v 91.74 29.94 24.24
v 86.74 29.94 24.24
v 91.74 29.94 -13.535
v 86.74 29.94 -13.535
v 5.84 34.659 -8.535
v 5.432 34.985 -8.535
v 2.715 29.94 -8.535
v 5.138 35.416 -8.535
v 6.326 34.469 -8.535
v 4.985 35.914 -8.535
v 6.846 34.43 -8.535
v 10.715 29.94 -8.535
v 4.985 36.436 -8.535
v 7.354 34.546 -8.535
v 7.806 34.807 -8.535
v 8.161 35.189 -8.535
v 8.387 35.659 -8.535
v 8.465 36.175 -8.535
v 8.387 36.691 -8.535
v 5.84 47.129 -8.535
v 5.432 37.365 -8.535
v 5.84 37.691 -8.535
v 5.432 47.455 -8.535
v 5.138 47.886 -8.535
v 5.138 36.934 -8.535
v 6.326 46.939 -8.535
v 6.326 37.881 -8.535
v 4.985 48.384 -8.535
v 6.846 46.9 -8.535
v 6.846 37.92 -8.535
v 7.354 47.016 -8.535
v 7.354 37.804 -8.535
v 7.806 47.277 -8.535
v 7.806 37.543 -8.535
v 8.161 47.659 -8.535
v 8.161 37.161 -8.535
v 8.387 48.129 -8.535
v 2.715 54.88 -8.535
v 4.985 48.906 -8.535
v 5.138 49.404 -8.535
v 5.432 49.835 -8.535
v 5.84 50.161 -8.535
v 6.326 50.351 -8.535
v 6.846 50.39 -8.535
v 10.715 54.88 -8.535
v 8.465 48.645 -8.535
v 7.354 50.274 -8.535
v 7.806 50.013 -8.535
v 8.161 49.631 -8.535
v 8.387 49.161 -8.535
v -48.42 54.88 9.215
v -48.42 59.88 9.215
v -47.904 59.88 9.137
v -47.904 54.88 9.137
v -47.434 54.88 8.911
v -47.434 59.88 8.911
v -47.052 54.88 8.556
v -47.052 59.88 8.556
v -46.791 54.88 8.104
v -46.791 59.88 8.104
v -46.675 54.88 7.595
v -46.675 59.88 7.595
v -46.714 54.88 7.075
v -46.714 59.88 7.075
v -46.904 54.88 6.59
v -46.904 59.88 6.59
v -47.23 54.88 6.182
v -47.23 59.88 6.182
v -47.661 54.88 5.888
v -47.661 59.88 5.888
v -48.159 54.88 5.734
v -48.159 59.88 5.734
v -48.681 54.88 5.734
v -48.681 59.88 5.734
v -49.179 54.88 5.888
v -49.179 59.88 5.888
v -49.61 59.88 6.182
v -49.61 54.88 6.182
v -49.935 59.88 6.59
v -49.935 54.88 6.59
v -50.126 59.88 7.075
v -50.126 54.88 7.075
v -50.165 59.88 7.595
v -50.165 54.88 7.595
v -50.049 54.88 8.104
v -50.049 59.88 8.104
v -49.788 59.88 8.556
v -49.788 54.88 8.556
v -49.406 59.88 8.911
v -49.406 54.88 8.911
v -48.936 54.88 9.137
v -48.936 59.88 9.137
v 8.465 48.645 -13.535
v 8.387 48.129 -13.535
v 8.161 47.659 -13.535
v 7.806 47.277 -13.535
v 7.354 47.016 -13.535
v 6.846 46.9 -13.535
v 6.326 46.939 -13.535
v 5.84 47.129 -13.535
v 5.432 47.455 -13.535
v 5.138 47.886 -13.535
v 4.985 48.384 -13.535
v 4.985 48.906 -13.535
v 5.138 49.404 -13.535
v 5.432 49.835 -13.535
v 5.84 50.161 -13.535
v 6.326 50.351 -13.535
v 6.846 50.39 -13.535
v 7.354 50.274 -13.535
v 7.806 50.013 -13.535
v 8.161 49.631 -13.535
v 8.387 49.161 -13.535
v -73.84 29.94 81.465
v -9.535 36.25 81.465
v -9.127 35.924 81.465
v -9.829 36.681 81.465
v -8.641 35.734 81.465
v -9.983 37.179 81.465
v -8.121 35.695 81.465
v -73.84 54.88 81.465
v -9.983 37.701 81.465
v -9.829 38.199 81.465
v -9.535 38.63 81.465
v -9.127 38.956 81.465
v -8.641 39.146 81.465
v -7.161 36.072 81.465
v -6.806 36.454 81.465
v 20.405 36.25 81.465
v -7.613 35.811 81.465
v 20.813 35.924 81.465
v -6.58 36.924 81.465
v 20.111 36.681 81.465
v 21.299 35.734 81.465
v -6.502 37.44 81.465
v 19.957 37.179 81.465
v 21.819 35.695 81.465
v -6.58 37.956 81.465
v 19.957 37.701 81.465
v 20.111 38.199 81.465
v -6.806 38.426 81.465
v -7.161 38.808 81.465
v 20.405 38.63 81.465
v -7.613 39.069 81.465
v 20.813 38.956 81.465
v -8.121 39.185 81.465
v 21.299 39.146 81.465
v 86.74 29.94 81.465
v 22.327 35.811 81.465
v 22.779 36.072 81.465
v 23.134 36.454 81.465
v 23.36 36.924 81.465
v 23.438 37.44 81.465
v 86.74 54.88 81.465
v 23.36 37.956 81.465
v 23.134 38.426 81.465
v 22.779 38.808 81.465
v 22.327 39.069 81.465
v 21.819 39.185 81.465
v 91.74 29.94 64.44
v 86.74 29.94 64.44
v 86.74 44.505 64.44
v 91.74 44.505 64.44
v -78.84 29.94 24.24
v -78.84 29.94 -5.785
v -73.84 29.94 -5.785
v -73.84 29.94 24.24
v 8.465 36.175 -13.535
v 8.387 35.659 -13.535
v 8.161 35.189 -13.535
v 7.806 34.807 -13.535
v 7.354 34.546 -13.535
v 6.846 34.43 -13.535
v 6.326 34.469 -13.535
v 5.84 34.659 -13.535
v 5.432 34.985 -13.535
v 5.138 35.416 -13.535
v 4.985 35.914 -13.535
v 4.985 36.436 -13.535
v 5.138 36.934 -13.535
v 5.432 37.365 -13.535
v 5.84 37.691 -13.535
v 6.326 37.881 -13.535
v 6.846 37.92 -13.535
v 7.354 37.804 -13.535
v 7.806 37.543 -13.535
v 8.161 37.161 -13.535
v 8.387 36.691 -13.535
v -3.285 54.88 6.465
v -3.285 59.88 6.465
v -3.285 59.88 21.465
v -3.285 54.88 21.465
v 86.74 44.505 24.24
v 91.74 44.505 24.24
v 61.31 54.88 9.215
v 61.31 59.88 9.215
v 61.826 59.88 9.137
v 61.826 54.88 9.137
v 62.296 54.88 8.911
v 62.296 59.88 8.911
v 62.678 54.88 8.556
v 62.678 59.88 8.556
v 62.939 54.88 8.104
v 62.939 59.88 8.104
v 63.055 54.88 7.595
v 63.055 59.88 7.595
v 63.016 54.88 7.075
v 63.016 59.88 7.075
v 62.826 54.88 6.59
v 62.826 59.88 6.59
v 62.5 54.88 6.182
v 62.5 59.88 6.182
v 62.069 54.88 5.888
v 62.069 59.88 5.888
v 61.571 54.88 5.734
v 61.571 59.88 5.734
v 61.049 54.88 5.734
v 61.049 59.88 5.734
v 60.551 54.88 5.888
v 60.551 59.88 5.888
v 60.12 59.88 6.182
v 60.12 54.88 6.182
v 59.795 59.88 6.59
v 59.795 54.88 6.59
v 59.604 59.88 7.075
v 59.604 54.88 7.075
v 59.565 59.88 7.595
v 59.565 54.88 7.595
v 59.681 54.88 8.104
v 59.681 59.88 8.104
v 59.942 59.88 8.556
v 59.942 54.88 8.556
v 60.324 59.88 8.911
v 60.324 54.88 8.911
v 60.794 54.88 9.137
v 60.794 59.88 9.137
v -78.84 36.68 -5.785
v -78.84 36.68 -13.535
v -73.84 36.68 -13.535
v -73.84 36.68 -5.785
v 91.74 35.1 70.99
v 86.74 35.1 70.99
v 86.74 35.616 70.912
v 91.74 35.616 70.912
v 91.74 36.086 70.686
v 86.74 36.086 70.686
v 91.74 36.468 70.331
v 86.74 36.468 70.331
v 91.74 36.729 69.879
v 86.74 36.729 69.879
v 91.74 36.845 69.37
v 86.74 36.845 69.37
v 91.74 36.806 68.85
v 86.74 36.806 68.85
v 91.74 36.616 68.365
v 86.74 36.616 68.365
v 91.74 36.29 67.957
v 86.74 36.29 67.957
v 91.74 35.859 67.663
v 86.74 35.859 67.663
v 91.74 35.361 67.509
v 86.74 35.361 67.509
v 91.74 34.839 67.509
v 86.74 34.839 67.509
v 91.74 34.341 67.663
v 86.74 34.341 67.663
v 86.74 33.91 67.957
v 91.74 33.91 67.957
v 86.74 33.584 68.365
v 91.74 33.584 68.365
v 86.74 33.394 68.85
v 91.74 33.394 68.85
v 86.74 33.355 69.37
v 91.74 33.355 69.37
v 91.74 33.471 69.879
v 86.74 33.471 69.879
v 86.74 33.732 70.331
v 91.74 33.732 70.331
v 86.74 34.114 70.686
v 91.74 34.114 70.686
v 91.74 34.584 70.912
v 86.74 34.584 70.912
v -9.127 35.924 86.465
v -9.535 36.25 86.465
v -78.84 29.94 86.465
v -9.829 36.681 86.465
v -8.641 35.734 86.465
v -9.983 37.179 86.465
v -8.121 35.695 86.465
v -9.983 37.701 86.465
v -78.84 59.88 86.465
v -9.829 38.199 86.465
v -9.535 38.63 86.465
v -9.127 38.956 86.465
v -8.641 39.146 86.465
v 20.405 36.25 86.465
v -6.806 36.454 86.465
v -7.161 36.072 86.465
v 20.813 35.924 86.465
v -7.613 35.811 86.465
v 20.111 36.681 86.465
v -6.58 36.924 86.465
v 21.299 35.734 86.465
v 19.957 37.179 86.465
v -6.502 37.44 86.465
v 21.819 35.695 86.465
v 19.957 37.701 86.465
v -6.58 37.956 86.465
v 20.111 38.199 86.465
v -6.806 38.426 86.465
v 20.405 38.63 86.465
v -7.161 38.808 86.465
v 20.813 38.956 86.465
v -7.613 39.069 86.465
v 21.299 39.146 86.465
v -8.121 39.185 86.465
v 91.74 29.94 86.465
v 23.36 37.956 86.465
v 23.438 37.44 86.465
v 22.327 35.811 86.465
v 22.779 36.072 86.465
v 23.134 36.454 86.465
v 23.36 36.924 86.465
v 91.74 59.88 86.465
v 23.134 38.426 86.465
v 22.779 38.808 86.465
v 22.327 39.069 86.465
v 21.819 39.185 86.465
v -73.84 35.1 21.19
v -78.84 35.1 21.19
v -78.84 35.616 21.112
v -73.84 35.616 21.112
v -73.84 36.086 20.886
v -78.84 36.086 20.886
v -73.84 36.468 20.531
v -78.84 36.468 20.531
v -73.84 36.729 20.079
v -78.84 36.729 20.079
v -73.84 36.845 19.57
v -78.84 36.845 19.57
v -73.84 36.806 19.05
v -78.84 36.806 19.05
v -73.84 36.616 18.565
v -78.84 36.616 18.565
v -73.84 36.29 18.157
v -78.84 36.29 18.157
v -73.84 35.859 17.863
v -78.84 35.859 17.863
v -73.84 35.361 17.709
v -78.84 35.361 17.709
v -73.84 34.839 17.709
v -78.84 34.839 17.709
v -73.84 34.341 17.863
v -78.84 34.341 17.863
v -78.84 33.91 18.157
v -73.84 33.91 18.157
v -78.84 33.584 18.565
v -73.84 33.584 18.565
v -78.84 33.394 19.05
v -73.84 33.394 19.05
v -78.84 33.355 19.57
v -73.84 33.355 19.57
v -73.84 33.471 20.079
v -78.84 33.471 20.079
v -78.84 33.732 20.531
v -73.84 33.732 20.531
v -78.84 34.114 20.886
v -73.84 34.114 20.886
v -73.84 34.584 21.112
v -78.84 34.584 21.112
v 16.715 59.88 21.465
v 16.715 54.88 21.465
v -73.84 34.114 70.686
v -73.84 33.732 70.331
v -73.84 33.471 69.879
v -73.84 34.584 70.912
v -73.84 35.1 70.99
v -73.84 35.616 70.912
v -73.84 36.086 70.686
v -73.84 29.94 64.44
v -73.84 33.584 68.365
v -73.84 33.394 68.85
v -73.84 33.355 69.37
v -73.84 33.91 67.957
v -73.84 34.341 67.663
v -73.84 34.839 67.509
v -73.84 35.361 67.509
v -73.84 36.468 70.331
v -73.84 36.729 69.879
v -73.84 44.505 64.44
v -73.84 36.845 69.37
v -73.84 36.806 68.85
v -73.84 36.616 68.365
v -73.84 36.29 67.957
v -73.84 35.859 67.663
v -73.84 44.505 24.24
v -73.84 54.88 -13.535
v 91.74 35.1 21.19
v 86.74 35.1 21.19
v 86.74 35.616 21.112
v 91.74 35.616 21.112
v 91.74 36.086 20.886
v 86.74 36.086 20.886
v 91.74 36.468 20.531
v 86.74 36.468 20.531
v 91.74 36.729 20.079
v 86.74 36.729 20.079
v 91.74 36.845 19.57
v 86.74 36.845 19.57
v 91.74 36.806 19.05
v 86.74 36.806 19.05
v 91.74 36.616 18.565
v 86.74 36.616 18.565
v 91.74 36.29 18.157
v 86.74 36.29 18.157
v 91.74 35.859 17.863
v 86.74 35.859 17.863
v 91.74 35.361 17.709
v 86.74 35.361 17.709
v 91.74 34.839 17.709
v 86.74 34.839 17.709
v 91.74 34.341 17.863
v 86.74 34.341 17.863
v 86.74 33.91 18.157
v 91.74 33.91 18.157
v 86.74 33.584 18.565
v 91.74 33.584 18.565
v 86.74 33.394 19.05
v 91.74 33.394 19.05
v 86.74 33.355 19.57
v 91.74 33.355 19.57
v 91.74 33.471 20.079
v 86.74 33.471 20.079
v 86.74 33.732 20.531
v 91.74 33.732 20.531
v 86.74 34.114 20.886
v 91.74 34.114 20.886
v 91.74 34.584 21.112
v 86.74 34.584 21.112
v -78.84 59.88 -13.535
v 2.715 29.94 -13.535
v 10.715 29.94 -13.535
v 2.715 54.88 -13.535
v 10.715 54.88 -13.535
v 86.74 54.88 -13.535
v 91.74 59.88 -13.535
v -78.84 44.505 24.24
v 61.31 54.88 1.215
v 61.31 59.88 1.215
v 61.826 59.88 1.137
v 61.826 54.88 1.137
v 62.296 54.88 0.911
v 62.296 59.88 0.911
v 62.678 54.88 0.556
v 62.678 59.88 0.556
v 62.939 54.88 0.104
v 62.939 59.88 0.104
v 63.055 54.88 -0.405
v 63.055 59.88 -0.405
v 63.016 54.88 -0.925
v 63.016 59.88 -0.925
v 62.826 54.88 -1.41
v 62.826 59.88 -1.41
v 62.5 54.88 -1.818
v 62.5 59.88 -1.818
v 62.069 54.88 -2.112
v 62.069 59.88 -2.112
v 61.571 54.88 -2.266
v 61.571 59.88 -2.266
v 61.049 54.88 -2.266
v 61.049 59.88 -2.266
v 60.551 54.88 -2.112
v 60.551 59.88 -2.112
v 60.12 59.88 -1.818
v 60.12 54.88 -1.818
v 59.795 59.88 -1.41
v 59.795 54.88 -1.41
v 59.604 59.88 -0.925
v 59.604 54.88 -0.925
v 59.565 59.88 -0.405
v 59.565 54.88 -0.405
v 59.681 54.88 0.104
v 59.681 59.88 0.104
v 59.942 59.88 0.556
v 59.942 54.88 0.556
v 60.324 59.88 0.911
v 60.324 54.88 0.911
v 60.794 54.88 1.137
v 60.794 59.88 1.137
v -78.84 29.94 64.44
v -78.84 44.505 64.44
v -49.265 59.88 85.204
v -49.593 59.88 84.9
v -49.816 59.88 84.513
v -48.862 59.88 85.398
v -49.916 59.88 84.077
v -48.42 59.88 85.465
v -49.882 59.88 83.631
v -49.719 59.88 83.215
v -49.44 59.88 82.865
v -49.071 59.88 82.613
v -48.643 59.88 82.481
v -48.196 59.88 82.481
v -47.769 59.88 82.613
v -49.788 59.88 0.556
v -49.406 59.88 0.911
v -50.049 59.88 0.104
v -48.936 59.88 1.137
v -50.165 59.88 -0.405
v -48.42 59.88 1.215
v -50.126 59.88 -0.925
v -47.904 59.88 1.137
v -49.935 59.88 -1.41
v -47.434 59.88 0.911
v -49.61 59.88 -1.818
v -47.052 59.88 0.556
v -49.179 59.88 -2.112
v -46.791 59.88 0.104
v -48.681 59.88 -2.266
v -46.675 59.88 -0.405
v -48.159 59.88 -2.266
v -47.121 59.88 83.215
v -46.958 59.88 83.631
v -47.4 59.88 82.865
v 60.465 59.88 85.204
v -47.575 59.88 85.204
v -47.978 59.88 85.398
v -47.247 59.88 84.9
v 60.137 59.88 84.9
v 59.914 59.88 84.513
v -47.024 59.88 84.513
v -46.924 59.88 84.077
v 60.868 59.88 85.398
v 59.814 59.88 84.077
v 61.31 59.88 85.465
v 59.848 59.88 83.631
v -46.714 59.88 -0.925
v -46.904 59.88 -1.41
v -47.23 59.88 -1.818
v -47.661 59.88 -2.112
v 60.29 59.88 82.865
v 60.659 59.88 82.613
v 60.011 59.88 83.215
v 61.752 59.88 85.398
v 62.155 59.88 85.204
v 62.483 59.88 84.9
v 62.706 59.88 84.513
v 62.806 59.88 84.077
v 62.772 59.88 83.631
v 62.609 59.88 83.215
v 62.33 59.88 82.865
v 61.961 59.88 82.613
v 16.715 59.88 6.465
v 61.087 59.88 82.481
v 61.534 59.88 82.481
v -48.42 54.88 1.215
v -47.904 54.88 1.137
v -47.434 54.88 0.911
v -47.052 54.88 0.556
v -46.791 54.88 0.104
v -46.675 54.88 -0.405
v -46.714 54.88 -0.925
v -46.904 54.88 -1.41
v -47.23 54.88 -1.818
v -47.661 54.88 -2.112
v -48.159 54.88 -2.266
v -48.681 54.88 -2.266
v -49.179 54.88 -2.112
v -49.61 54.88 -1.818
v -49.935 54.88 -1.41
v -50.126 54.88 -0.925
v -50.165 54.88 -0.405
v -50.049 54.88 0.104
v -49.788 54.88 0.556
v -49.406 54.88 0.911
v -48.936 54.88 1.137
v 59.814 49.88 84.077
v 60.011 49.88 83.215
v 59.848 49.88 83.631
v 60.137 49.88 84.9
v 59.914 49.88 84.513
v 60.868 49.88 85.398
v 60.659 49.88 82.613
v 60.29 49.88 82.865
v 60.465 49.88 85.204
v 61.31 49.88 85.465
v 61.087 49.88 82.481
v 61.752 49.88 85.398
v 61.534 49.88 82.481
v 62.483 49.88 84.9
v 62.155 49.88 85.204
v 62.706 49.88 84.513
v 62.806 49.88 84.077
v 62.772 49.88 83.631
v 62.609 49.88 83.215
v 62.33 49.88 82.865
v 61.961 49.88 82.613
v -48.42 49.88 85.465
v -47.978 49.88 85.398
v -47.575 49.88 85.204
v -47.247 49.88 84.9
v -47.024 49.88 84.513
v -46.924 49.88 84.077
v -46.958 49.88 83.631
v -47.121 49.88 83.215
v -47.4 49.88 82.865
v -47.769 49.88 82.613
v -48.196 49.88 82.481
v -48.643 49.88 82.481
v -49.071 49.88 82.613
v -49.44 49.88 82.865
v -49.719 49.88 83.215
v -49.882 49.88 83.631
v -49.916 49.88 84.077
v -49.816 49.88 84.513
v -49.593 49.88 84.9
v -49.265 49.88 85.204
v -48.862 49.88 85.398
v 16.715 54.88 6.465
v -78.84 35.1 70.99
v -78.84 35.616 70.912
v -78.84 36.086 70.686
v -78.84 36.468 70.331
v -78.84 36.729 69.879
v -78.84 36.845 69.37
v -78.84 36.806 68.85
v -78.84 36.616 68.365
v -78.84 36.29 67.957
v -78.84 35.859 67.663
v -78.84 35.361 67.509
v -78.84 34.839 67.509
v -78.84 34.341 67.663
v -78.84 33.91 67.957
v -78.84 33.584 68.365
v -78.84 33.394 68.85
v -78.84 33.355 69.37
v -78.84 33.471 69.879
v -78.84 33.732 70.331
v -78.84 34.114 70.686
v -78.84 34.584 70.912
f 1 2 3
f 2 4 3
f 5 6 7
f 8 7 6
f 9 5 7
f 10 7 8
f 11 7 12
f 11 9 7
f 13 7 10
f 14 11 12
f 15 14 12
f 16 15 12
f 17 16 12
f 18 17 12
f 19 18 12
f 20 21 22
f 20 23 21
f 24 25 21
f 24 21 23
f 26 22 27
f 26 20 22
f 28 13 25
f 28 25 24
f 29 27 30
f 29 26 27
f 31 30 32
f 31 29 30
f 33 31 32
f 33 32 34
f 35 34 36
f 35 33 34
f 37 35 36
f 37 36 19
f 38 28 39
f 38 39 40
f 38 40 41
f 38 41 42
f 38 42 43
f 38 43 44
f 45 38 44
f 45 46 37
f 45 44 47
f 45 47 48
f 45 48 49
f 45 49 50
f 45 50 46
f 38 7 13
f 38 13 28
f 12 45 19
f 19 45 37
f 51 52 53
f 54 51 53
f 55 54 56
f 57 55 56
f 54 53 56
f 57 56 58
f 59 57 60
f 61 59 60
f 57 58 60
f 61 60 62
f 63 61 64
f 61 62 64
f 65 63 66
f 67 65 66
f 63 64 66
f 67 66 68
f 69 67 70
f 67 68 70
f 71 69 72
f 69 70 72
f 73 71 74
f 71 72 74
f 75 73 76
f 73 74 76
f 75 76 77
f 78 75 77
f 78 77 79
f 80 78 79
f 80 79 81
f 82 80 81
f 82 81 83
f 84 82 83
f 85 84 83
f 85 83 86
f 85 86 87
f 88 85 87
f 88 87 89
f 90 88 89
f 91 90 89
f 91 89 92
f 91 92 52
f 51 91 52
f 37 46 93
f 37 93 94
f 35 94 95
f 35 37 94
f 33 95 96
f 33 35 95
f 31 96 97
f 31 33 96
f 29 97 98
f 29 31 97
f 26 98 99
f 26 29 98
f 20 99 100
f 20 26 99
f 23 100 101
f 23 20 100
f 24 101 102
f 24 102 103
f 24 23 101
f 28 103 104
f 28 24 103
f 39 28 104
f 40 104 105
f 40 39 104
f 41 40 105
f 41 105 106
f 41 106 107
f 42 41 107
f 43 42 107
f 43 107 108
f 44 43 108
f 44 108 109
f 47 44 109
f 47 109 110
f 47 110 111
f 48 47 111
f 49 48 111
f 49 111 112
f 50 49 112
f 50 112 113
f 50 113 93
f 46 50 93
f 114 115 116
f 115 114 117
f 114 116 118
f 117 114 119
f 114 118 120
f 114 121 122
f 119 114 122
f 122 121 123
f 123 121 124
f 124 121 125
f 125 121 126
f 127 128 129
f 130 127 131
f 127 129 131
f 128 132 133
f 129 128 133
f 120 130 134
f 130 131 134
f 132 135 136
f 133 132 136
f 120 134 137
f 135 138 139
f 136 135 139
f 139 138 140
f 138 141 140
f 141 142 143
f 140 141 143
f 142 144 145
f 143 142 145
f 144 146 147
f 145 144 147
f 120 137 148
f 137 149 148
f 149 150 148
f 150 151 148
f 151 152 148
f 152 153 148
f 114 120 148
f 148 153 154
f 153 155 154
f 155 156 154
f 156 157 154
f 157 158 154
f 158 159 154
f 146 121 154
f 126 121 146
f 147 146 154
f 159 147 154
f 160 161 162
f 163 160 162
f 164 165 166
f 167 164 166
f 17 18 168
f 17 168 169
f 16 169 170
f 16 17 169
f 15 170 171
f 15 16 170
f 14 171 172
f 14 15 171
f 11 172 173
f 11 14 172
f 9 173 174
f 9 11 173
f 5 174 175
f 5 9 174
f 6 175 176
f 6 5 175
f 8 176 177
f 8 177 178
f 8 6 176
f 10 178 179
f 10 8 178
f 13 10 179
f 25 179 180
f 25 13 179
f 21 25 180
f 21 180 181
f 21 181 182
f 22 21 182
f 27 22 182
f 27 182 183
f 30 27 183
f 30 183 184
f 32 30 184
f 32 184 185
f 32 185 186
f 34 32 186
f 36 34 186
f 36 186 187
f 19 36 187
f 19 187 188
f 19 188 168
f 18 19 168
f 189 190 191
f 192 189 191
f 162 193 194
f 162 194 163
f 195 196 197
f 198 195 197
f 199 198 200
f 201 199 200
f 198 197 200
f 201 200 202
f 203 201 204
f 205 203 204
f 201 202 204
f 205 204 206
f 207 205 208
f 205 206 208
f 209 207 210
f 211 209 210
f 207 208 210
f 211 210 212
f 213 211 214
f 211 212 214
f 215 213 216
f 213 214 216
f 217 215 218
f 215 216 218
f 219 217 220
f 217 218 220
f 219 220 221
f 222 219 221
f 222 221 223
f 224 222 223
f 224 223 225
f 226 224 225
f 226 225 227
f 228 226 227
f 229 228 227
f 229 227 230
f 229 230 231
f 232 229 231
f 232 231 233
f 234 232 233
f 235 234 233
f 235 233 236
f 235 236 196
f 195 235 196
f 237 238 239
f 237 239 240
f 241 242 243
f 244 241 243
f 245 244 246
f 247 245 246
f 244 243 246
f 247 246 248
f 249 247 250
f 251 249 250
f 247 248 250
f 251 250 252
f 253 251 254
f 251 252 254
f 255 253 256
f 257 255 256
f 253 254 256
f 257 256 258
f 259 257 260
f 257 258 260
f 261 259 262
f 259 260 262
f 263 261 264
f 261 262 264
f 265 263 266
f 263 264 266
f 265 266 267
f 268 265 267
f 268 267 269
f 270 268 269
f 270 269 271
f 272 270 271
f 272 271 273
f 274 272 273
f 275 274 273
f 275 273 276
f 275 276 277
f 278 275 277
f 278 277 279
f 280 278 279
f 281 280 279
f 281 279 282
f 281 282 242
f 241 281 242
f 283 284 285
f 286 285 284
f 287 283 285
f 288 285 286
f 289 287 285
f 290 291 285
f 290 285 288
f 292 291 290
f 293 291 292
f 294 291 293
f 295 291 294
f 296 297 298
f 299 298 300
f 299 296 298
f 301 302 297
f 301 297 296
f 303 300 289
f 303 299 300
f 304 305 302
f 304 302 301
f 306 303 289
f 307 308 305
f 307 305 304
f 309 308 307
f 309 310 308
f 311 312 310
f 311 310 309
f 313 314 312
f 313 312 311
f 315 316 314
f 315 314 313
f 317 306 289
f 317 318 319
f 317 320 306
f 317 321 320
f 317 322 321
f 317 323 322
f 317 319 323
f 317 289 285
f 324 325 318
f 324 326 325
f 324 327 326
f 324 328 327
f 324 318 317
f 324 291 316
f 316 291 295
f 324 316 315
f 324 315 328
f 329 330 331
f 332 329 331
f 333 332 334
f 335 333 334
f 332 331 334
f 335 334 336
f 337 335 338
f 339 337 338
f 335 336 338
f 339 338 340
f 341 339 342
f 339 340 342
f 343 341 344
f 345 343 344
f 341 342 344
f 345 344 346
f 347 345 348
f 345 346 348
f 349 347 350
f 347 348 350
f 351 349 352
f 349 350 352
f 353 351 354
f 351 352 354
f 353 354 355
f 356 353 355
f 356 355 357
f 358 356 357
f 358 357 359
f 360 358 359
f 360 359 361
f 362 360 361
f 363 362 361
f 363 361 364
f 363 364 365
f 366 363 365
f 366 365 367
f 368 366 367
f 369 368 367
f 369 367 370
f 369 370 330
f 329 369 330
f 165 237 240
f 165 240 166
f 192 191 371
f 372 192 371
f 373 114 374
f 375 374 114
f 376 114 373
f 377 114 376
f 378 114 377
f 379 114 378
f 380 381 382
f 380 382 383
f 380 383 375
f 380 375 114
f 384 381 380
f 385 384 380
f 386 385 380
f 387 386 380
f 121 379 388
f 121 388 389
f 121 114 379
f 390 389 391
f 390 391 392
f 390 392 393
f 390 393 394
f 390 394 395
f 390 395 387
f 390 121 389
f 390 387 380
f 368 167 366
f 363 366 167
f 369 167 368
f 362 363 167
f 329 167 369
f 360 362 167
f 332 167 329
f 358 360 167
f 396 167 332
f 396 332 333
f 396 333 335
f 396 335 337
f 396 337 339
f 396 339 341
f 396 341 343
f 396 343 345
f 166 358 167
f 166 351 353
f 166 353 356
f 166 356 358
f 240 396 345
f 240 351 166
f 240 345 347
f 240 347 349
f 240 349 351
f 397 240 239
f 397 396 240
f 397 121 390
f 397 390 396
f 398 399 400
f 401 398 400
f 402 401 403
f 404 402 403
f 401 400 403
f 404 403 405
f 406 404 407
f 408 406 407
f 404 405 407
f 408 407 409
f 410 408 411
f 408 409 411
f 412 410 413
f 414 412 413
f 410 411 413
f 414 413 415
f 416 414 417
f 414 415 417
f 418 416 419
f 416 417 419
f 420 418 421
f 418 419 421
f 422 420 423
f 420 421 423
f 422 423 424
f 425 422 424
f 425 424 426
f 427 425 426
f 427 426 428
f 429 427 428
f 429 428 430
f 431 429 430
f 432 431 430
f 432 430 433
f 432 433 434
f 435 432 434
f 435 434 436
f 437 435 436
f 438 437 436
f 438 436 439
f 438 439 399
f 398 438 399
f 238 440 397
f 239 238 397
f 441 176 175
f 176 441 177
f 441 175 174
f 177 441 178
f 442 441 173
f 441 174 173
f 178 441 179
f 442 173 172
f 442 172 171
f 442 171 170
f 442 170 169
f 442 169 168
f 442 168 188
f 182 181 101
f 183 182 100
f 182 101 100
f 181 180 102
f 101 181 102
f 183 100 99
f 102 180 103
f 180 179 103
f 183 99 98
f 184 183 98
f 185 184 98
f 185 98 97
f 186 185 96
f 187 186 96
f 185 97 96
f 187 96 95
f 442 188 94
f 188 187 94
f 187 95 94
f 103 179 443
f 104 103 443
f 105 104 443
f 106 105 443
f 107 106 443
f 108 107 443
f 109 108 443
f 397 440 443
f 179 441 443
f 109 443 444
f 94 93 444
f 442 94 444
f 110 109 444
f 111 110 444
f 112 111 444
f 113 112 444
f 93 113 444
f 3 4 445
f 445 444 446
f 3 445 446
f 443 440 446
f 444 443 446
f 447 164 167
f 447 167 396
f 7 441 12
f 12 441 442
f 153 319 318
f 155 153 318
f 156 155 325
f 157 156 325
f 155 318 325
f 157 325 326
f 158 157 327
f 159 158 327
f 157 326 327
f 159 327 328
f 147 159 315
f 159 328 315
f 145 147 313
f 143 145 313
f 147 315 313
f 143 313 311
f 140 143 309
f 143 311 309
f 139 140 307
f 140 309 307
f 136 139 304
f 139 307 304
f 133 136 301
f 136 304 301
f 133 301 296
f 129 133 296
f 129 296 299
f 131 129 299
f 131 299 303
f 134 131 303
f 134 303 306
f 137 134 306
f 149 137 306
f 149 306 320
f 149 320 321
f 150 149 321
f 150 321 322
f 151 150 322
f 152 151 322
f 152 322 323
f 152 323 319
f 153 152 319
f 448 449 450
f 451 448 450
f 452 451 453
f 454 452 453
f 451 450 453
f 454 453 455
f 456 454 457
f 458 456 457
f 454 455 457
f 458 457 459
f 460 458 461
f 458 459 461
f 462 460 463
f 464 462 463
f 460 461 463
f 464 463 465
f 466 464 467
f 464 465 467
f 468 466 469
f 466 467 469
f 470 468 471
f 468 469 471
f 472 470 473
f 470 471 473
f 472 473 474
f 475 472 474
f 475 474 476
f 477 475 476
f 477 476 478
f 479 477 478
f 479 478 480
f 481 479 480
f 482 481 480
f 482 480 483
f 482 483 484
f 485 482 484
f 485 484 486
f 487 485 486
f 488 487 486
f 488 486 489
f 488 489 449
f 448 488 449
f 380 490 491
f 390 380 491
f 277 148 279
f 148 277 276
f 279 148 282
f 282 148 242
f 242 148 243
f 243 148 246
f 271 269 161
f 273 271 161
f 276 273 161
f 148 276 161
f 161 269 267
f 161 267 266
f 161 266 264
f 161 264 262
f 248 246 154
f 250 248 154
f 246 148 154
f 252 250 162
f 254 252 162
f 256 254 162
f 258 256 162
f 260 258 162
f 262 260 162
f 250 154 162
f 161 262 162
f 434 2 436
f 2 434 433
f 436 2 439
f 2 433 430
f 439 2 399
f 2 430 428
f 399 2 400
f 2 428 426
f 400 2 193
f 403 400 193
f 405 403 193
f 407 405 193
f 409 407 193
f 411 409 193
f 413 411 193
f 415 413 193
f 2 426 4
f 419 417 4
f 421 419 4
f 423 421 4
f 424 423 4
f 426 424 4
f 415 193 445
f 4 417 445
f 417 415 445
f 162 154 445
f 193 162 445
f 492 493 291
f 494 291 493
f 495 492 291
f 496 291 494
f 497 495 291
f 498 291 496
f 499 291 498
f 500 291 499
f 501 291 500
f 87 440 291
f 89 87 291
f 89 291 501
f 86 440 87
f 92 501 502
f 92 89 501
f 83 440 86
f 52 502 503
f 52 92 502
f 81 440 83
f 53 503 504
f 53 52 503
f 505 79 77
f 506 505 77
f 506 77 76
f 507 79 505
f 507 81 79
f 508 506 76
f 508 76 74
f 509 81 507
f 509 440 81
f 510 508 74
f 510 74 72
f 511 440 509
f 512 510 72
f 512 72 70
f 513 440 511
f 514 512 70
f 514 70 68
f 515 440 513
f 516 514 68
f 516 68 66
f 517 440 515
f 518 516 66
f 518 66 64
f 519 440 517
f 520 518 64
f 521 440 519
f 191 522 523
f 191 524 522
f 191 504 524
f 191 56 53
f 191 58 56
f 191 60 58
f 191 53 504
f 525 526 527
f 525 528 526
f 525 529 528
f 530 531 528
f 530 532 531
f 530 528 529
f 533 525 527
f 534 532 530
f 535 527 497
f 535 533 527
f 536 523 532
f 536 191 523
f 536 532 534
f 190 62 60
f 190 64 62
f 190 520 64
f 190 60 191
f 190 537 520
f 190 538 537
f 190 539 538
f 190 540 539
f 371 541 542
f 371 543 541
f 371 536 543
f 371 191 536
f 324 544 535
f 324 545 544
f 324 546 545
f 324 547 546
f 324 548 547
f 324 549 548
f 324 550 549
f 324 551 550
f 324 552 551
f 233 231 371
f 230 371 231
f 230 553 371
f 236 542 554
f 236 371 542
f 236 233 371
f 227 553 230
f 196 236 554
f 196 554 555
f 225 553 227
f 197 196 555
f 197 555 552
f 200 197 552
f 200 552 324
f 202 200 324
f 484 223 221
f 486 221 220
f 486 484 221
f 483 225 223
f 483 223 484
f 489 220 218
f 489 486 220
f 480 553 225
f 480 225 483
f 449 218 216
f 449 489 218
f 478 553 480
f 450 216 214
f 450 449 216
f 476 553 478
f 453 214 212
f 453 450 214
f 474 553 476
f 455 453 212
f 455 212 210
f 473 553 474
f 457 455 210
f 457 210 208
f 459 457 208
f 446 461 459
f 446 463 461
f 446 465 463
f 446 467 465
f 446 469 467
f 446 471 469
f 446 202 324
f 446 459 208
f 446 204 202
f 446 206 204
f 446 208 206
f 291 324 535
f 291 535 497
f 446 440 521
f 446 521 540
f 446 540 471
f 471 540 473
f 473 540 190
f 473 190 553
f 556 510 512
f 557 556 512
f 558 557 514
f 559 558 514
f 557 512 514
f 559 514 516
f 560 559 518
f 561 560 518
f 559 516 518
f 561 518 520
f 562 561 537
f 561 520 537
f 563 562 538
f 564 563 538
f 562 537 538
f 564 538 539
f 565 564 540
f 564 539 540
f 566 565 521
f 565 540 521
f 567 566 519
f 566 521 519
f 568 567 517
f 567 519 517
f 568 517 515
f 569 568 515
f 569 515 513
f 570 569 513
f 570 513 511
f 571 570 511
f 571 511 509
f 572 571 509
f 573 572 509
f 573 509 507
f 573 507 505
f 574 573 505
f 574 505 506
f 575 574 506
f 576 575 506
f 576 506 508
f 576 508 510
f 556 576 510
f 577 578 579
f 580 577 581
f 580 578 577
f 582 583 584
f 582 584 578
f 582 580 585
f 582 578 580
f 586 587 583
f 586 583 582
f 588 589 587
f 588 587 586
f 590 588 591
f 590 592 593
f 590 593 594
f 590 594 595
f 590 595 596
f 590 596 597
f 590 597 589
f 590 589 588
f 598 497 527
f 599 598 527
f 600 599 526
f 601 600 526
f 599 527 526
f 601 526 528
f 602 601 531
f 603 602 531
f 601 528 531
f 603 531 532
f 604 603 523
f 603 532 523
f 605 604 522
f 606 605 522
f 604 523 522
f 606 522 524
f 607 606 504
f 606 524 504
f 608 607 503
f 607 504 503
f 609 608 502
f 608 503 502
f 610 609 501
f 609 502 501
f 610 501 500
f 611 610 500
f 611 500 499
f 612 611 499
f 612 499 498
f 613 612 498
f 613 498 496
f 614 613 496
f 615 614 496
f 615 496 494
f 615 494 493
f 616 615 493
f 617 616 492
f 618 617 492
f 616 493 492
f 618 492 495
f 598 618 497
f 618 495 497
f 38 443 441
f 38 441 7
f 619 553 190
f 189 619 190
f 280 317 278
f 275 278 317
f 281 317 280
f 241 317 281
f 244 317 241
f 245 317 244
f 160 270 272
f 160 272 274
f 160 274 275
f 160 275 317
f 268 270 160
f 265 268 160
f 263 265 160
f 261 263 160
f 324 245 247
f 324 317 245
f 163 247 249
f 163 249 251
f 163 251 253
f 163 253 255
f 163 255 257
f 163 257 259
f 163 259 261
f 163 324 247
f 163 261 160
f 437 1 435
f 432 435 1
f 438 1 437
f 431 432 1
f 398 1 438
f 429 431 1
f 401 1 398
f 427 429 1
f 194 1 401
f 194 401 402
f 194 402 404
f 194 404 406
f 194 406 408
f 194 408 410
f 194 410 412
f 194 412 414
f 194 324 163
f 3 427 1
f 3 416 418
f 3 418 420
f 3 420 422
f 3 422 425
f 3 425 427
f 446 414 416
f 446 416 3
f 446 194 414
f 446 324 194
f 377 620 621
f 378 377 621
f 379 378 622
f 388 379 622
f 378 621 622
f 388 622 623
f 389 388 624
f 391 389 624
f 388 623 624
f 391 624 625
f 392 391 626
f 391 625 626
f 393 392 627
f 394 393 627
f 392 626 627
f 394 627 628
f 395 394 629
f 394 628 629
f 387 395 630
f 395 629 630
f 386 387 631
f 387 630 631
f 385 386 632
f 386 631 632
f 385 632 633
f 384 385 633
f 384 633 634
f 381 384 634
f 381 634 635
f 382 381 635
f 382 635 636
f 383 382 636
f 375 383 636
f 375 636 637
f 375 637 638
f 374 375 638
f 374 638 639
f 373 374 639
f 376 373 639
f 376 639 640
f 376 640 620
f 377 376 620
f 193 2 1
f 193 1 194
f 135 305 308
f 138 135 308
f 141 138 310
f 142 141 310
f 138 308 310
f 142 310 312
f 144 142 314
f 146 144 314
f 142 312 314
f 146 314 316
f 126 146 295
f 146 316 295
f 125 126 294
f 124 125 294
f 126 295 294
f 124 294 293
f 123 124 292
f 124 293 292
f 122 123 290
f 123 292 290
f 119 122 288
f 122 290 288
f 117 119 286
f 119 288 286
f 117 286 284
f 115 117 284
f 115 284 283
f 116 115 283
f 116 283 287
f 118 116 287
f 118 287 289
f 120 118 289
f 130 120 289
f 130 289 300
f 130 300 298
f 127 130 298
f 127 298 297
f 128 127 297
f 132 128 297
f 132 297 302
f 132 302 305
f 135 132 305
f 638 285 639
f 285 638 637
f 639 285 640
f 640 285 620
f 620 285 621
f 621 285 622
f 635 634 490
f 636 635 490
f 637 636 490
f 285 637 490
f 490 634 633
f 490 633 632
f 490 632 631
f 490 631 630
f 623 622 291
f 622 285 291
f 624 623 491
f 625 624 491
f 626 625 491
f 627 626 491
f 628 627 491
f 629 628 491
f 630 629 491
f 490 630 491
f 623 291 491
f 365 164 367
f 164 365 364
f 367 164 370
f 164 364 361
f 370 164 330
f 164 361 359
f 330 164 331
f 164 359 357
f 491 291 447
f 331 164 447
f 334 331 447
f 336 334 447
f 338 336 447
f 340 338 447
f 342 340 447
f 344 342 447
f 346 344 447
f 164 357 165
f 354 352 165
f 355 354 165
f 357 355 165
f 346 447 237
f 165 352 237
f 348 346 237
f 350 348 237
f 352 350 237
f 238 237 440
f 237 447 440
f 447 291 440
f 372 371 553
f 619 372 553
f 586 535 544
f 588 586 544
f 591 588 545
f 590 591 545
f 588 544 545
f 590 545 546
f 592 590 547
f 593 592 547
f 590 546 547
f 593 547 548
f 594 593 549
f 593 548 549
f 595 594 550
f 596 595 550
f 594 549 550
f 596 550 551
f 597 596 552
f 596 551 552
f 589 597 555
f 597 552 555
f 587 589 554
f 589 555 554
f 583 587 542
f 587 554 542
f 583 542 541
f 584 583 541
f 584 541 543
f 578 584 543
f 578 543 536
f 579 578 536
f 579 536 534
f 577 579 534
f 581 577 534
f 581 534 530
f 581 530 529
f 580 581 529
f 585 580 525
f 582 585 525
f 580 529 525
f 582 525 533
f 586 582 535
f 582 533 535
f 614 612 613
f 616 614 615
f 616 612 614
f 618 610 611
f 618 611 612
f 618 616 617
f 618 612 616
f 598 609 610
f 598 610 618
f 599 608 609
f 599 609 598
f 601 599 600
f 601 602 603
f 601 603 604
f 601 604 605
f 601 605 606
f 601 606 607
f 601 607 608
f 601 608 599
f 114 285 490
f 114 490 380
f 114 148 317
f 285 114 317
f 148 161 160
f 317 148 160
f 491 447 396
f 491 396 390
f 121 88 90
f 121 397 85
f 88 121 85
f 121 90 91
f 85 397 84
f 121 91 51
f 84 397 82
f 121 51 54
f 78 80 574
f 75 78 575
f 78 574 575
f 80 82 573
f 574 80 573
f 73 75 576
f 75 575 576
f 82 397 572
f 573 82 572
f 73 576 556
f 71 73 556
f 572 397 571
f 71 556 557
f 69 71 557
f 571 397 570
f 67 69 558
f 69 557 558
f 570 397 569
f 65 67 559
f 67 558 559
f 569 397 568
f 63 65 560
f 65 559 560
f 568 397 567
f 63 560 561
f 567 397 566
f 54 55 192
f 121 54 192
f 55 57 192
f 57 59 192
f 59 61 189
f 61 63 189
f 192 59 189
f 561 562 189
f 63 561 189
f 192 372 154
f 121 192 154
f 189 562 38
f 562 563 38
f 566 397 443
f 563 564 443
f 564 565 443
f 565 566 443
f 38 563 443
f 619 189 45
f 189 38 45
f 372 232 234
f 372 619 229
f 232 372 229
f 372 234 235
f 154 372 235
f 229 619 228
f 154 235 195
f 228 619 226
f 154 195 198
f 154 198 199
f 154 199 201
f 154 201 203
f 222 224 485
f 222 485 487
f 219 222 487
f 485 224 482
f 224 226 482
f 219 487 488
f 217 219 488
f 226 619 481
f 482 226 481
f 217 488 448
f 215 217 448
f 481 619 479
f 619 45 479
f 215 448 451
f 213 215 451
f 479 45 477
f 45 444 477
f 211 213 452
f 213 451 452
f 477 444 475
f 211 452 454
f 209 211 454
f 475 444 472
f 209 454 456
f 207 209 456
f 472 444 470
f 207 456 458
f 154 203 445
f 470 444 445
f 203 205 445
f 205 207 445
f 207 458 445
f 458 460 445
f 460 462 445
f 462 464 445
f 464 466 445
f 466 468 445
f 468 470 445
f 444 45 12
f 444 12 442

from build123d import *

# Parameters (mm, degrees)
SKETCH3_W           = 170.58
SKETCH3_H           = 100
BOSS_EXTRUDE1_DEPTH = 5
SKETCH4_W           = 5
SKETCH4_H           = 100
BOSS_EXTRUDE2_DEPTH = 24.94
SKETCH6_W           = 160.58
SKETCH6_H           = 5
BOSS_EXTRUDE3_DEPTH = 24.94
BOSS_EXTRUDE4_DEPTH = 24.94
SKETCH8_R           = 1.75
CUT_EXTRUDE1_DEPTH  = 8
SKETCH9_W           = 7.75
SKETCH9_H           = 6.74
CUT_EXTRUDE2_DEPTH  = 10
CUT_EXTRUDE3_DEPTH  = 10
SKETCH11_R          = 1.75
CUT_EXTRUDE4_DEPTH  = 10
SKETCH13_W          = 40.2
SKETCH13_H          = 14.565
CUT_EXTRUDE6_DEPTH  = 200
SKETCH14_R          = 1.75
CUT_EXTRUDE7_DEPTH  = 200
SKETCH15_R          = 1.5
CUT_EXTRUDE8_DEPTH  = 10
SKETCH16_R          = 1.75
CUT_EXTRUDE9_DEPTH  = 10


with BuildPart() as part:
    # Sketch3 → Boss-Extrude1 (new body)
    with BuildSketch(Plane(origin=(0, 0, 0), x_dir=(1, 0, 0), z_dir=(0, 1, 0))):
        with Locations((6.45008576, -36.464595487)):
            Rectangle(SKETCH3_W, SKETCH3_H)
    extrude(amount=BOSS_EXTRUDE1_DEPTH)

    # Sketch4 → Boss-Extrude2 (add)
    with BuildSketch(Plane(origin=(0, 5, 0), x_dir=(1, 0, 0), z_dir=(0, 1, 0))):
        with Locations((89.24008576, -36.464595487)):
            Rectangle(SKETCH4_W, SKETCH4_H)
        with Locations((-76.33991424, -36.464595487)):
            Rectangle(SKETCH4_W, SKETCH4_H)
    extrude(amount=BOSS_EXTRUDE2_DEPTH)

    # Sketch6 → Boss-Extrude3 (add)
    with BuildSketch(Plane(origin=(0, 5, 0), x_dir=(1, 0, 0), z_dir=(0, 1, 0))):
        with Locations((6.45008576, -83.964595487)):
            Rectangle(SKETCH6_W, SKETCH6_H)
    extrude(amount=BOSS_EXTRUDE3_DEPTH)

    # Sketch7 → Boss-Extrude4 (add)
    with BuildSketch(Plane(origin=(0, 5, 0), x_dir=(1, 0, 0), z_dir=(0, 1, 0))):
        Polygon((6.45008576, 13.535404513), (2.715085759, 13.535404513), (2.715085759, 8.535404513), (10.715085759, 8.535404513), (10.715085759, 13.535404513), align=None)
    extrude(amount=BOSS_EXTRUDE4_DEPTH)

    # Sketch8 → Cut-Extrude1 (cut)
    with BuildSketch(Plane.XY.offset(-8.535404513)):
        with Locations((6.715085759, 11.235)):
            Circle(SKETCH8_R)
        with Locations((6.715085759, 23.705)):
            Circle(SKETCH8_R)
    extrude(amount=-CUT_EXTRUDE1_DEPTH, mode=Mode.SUBTRACT)

    # Sketch9 → Cut-Extrude2 (cut)
    with BuildSketch(Plane.ZY.offset(78.83991424)):
        with Locations((-9.660404513, 26.57)):
            Rectangle(SKETCH9_W, SKETCH9_H)
    extrude(amount=-CUT_EXTRUDE2_DEPTH, mode=Mode.SUBTRACT)


with BuildPart() as body_2:
    # Mirror1: mirrored copy
    add(part.part.mirror(Plane(origin=(0, 29.94, 0), x_dir=(0, 0, 1), z_dir=(0, -1, 0))))

    # Sketch10 → Cut-Extrude3 (cut)
    with BuildSketch(Plane(origin=(0, 59.88, 0), x_dir=(1, 0, 0), z_dir=(0, 1, 0))):
        Polygon((16.71508576, -6.464595487), (6.45008576, -6.464595487), (-3.28491424, -6.464595487), (-3.28491424, -21.464595487), (16.71508576, -21.464595487), align=None)
    extrude(amount=-CUT_EXTRUDE3_DEPTH, mode=Mode.SUBTRACT)

    # Sketch11 → Cut-Extrude4 (cut)
    with BuildSketch(Plane(origin=(0, 59.88, 0), x_dir=(1, 0, 0), z_dir=(0, 1, 0))):
        with Locations(Location((-48.41990951, 0.535400876, 0), (0, 0, 270))):
            Circle(SKETCH11_R)
        with Locations(Location((-48.41990951, -7.464599124, 0), (0, 0, 270))):
            Circle(SKETCH11_R)
        with Locations(Location((61.31009049, -7.464599124, 0), (0, 0, 270))):
            Circle(SKETCH11_R)
        with Locations(Location((61.31009049, 0.535400876, 0), (0, 0, 270))):
            Circle(SKETCH11_R)
    extrude(amount=-CUT_EXTRUDE4_DEPTH, mode=Mode.SUBTRACT)

    # Sketch13 → Cut-Extrude6 (cut)
    with BuildSketch(Plane.ZY.offset(78.83991424)):
        with Locations((44.339595487, 37.2225)):
            Rectangle(SKETCH13_W, SKETCH13_H)
    extrude(amount=-CUT_EXTRUDE6_DEPTH, mode=Mode.SUBTRACT)

    # Sketch14 → Cut-Extrude7 (cut)
    with BuildSketch(Plane.ZY.offset(78.83991424)):
        with Locations((19.43959554, 35.1)):
            Circle(SKETCH14_R)
        with Locations((69.23959554, 35.1)):
            Circle(SKETCH14_R)
    extrude(amount=-CUT_EXTRUDE7_DEPTH, mode=Mode.SUBTRACT)

    # Sketch15 → Cut-Extrude8 (cut)
    with BuildSketch(Plane(origin=(0, 59.88, 0), x_dir=(1, 0, 0), z_dir=(0, 1, 0))):
        with Locations(Location((61.31009049, -83.964595487, 0), (0, 0, 270))):
            Circle(SKETCH15_R)
        with Locations(Location((-48.41990951, -83.964595487, 0), (0, 0, 270))):
            Circle(SKETCH15_R)
    extrude(amount=-CUT_EXTRUDE8_DEPTH, mode=Mode.SUBTRACT)

    # Sketch16 → Cut-Extrude9 (cut)
    with BuildSketch(Plane.XY.offset(86.464595487)):
        with Locations((21.687920531, 37.44)):
            Circle(SKETCH16_R)
        with Locations((-8.252079469, 37.44)):
            Circle(SKETCH16_R)
    extrude(amount=-CUT_EXTRUDE9_DEPTH, mode=Mode.SUBTRACT)


solid = body_2.part
